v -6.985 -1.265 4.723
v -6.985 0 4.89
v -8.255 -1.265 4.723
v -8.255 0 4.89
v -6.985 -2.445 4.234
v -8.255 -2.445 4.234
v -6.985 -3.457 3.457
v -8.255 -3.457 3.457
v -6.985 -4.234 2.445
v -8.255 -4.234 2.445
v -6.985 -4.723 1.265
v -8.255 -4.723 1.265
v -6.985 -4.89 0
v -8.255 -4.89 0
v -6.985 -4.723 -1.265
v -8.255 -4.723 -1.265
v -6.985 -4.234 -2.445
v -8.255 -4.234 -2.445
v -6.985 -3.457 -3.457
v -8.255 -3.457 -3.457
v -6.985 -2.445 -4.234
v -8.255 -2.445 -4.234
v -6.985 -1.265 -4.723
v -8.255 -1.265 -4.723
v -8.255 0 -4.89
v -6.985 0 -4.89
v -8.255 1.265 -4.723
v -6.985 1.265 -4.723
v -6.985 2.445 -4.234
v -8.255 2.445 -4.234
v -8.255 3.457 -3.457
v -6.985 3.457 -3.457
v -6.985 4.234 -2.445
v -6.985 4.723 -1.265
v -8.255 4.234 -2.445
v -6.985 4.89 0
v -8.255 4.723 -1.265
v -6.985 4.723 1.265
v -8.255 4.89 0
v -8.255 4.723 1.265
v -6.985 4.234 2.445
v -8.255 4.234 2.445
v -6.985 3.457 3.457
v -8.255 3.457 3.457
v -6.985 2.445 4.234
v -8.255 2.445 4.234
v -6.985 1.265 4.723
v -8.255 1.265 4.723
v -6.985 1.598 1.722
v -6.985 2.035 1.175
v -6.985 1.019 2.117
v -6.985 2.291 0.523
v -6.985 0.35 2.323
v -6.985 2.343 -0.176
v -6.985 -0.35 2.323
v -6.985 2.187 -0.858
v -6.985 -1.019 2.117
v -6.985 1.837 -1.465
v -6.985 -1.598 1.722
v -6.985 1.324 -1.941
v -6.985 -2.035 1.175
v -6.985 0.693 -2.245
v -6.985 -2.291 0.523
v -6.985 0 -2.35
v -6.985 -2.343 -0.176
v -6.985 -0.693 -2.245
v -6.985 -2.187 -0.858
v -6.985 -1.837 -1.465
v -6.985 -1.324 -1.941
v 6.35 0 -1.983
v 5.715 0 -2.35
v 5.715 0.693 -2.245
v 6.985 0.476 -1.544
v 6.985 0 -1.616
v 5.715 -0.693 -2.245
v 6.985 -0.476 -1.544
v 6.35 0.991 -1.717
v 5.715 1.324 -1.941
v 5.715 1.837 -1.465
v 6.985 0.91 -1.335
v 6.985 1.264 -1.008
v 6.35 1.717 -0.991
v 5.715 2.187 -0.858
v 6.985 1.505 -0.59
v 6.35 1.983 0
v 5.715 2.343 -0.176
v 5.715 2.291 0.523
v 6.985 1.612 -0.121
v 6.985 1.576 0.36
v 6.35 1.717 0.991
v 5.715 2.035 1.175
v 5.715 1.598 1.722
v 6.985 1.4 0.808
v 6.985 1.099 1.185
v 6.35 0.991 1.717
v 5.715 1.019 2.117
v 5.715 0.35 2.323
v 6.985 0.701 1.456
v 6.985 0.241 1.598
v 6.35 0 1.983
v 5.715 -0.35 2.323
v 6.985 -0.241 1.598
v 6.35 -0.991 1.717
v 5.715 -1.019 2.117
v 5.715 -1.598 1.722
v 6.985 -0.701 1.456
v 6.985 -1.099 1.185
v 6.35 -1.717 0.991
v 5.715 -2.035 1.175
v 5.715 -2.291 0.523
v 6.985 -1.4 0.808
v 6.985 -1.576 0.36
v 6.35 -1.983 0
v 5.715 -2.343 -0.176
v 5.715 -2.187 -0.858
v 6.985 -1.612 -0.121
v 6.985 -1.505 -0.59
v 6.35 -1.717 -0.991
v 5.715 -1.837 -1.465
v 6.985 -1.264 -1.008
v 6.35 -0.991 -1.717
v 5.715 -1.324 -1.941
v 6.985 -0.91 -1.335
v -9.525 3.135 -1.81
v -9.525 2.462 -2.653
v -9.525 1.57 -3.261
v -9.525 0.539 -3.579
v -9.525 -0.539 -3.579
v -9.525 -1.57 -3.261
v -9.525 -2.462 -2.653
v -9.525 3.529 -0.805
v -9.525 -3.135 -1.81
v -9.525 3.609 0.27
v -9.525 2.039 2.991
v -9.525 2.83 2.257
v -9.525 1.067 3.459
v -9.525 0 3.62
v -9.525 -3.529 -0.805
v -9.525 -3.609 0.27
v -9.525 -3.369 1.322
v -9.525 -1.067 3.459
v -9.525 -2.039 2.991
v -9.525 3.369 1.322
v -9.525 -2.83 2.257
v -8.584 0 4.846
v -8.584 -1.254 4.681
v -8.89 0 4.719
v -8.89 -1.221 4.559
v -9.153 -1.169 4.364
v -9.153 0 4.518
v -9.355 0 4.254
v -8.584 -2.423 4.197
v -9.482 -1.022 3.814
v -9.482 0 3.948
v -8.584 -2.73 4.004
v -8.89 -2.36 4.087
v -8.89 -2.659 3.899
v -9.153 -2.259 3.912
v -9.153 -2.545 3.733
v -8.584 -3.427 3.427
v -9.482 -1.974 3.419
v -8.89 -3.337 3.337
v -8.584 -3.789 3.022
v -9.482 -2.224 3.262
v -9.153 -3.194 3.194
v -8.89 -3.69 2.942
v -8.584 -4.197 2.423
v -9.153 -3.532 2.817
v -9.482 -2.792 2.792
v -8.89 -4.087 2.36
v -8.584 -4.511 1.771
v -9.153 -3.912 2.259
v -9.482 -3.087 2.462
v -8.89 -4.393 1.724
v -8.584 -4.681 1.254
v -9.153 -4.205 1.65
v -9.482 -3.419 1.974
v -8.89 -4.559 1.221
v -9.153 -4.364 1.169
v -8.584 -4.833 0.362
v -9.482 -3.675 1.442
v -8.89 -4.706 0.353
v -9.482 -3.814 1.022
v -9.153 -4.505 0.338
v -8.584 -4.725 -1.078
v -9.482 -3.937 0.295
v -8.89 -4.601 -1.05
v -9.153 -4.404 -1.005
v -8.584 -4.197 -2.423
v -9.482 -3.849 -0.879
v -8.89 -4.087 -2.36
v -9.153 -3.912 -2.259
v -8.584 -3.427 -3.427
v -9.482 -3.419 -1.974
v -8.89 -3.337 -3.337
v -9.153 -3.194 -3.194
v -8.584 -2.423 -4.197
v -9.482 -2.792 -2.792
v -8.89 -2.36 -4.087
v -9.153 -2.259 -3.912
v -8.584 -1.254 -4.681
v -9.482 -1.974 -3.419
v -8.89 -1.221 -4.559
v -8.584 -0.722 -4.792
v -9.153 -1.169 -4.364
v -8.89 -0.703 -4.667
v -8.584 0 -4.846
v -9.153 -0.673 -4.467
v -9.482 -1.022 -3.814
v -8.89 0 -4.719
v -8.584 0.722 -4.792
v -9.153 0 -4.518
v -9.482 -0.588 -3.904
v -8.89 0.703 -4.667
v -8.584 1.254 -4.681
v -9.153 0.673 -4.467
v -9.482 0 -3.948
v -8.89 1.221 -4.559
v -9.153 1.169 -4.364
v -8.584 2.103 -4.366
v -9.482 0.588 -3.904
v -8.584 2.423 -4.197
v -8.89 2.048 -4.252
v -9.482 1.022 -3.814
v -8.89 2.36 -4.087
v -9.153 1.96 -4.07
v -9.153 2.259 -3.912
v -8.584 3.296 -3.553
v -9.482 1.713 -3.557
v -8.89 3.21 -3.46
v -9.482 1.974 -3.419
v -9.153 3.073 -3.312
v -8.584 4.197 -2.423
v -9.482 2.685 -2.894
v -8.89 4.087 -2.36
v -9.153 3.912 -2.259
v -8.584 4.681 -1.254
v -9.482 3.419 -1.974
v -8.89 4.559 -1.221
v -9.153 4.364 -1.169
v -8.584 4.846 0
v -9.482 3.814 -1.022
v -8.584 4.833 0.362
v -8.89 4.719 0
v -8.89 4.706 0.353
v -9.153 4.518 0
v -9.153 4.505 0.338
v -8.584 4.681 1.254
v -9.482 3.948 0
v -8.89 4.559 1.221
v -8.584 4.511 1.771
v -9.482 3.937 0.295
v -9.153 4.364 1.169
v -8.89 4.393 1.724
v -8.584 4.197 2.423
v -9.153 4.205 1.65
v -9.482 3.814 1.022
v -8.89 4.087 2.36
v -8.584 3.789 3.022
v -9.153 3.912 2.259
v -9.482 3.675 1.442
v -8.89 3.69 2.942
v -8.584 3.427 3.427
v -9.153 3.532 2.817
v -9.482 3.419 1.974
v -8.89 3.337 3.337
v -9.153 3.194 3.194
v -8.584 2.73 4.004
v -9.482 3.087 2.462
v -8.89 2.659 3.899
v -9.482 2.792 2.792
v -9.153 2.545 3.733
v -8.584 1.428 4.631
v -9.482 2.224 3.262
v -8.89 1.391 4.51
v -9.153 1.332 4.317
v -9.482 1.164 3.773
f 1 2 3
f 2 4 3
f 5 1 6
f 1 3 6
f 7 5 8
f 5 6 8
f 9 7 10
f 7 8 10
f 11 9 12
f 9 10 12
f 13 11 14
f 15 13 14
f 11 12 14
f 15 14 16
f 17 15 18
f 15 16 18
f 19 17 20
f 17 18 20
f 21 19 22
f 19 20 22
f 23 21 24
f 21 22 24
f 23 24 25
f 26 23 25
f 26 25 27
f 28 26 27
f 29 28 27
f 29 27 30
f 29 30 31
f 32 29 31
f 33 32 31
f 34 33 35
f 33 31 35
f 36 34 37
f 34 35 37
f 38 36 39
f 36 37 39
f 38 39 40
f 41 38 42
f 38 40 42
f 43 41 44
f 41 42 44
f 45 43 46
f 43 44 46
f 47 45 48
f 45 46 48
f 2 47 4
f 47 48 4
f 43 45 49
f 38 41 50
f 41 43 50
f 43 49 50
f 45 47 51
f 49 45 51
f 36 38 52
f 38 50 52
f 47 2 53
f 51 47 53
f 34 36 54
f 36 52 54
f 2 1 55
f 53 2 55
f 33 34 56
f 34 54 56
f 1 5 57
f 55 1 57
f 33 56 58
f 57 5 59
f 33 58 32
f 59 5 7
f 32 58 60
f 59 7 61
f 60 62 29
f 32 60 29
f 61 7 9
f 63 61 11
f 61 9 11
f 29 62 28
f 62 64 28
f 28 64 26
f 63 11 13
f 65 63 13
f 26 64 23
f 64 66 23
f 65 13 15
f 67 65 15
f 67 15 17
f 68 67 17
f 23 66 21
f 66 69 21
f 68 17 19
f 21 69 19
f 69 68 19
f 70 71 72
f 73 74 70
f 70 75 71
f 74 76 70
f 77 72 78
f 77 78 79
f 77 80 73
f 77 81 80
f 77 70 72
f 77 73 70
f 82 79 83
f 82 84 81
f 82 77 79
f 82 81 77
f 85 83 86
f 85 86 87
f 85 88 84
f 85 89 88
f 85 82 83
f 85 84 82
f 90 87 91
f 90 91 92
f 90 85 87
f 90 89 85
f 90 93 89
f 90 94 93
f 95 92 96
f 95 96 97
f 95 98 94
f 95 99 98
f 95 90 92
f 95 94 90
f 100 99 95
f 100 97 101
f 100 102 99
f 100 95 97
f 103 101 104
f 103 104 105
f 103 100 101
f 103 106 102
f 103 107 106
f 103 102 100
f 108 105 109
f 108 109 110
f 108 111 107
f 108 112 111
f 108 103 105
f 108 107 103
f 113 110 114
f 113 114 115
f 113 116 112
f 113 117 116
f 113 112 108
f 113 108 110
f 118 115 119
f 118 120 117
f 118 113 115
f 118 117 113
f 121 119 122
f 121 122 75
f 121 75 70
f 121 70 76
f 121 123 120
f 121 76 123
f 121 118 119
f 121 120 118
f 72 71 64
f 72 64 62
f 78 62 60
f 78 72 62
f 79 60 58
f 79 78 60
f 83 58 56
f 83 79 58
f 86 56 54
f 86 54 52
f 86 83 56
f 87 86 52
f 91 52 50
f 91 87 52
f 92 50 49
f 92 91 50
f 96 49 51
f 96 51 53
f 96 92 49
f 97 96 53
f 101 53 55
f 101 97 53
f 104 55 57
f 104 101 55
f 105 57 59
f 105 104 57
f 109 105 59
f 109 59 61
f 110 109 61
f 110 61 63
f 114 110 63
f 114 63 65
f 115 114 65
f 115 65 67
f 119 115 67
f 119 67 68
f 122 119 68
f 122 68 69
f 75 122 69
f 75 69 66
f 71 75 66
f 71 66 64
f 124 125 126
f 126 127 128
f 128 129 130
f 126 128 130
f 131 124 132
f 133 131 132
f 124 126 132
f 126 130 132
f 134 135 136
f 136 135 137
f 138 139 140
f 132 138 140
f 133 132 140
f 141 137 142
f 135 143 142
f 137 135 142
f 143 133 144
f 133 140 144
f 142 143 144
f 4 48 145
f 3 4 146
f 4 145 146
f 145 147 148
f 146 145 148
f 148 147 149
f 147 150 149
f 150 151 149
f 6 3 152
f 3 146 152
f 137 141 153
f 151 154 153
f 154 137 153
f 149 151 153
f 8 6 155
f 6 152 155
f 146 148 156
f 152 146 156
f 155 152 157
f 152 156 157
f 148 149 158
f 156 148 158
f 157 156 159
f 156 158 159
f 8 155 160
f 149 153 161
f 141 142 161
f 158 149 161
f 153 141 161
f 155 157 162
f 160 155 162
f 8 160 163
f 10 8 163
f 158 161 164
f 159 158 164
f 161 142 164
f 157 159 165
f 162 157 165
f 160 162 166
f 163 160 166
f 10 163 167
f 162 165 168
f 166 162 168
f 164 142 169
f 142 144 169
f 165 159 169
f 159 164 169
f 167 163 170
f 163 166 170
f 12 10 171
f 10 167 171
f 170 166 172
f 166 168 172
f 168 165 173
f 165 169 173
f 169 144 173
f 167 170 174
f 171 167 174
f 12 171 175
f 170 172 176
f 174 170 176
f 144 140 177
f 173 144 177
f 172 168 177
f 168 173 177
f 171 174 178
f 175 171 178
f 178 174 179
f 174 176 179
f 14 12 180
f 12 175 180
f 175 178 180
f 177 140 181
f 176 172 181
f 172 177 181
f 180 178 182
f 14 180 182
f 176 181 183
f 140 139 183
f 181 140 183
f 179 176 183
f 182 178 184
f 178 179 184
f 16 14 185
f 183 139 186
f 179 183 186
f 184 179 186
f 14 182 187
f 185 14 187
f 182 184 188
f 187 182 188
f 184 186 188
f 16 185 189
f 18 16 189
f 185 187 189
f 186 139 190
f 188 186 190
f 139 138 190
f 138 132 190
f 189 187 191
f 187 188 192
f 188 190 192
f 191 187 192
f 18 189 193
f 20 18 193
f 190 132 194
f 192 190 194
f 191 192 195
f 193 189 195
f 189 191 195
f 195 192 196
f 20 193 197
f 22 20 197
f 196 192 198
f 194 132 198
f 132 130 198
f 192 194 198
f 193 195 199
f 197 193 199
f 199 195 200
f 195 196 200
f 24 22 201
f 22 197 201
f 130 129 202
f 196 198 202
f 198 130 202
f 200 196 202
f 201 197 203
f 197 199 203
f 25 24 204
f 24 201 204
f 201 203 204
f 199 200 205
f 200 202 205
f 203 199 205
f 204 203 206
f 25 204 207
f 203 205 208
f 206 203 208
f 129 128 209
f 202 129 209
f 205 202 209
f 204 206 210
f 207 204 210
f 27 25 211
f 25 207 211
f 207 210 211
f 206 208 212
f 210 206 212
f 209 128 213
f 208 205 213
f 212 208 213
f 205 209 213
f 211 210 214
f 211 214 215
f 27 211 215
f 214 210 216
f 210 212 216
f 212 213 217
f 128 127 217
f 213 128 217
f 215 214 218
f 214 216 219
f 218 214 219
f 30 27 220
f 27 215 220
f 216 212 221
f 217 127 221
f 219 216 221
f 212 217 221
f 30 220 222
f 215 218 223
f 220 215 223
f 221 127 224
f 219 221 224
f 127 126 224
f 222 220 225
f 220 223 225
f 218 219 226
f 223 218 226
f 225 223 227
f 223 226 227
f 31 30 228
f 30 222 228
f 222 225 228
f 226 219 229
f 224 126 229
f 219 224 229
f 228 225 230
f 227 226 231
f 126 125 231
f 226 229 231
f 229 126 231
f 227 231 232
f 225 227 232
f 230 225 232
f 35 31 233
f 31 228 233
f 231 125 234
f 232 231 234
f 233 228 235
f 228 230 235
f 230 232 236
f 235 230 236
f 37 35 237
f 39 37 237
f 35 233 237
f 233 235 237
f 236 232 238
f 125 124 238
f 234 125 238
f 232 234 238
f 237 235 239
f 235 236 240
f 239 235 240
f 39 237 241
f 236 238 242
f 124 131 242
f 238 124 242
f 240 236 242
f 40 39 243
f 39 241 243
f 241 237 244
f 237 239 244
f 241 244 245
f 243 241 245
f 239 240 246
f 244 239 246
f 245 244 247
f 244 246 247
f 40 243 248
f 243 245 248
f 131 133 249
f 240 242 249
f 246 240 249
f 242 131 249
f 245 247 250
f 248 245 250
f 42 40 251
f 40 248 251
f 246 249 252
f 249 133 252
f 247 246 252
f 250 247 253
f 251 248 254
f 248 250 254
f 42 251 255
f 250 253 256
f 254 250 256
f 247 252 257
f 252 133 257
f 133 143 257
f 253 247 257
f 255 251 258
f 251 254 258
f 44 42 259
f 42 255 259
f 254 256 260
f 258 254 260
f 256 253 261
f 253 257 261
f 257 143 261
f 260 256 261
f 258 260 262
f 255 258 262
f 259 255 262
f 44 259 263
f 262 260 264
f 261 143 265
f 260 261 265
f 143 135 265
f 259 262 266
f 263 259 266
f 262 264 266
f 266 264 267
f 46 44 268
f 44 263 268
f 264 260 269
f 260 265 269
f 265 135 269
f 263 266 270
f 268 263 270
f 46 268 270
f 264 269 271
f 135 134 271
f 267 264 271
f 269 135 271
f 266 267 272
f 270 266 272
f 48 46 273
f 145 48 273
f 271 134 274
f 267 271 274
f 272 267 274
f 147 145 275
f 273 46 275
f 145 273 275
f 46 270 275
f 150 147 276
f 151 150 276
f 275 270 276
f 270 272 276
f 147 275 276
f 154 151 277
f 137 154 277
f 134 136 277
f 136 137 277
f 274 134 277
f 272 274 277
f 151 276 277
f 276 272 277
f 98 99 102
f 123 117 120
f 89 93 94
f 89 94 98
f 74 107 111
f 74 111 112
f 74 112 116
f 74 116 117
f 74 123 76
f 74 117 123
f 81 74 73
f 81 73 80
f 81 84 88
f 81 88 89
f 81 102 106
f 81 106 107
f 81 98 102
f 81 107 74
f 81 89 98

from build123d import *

# Parameters (mm, degrees)
SKETCH1_R           = 2.3495
BOSS_EXTRUDE1_DEPTH = 6.985
CHAMFER1_SIZE       = 1.27
CHAMFER1_SIZE2      = 0.733234842


with BuildPart() as part:
    # Sketch1 → Boss-Extrude1 (new body, symmetric)
    with BuildSketch(Plane(origin=(0, 0, 0), x_dir=(0, 0, -1), z_dir=(1, 0, 0))):
        Circle(SKETCH1_R)
    extrude(amount=BOSS_EXTRUDE1_DEPTH, both=True)

    # Sketch2 → Revolve1 (revolve)
    with BuildSketch(Plane(origin=(0, 0, 0), x_dir=(1, 0, 0), z_dir=(0, 1, 0))):
        with BuildLine():
            Line((-9.525, 0), (-6.985, 0))
            Line((-6.985, 0), (-6.985, -4.8895))
            Line((-6.985, -4.8895), (-8.255, -4.8895))
            ThreePointArc((-8.255, -4.8895), (-9.153025612, -4.517525612), (-9.525, -3.6195))
            Line((-9.525, -3.6195), (-9.525, 0))
        make_face()
    revolve(axis=Axis((-9.525, 0, 0), (1, 0, 0)))

    # Chamfer1
    chamfer1_edges = [part.edges().sort_by_distance(p)[0] for p in [
        (6.985, 0, 2.3495),
    ]]
    chamfer1_side = [part.faces().sort_by_distance(p)[0] for p in [
        (0, 0, 2.3495),
    ]]
    chamfer(chamfer1_edges, length=CHAMFER1_SIZE, length2=CHAMFER1_SIZE2, reference=chamfer1_side[0])


solid = part.part
